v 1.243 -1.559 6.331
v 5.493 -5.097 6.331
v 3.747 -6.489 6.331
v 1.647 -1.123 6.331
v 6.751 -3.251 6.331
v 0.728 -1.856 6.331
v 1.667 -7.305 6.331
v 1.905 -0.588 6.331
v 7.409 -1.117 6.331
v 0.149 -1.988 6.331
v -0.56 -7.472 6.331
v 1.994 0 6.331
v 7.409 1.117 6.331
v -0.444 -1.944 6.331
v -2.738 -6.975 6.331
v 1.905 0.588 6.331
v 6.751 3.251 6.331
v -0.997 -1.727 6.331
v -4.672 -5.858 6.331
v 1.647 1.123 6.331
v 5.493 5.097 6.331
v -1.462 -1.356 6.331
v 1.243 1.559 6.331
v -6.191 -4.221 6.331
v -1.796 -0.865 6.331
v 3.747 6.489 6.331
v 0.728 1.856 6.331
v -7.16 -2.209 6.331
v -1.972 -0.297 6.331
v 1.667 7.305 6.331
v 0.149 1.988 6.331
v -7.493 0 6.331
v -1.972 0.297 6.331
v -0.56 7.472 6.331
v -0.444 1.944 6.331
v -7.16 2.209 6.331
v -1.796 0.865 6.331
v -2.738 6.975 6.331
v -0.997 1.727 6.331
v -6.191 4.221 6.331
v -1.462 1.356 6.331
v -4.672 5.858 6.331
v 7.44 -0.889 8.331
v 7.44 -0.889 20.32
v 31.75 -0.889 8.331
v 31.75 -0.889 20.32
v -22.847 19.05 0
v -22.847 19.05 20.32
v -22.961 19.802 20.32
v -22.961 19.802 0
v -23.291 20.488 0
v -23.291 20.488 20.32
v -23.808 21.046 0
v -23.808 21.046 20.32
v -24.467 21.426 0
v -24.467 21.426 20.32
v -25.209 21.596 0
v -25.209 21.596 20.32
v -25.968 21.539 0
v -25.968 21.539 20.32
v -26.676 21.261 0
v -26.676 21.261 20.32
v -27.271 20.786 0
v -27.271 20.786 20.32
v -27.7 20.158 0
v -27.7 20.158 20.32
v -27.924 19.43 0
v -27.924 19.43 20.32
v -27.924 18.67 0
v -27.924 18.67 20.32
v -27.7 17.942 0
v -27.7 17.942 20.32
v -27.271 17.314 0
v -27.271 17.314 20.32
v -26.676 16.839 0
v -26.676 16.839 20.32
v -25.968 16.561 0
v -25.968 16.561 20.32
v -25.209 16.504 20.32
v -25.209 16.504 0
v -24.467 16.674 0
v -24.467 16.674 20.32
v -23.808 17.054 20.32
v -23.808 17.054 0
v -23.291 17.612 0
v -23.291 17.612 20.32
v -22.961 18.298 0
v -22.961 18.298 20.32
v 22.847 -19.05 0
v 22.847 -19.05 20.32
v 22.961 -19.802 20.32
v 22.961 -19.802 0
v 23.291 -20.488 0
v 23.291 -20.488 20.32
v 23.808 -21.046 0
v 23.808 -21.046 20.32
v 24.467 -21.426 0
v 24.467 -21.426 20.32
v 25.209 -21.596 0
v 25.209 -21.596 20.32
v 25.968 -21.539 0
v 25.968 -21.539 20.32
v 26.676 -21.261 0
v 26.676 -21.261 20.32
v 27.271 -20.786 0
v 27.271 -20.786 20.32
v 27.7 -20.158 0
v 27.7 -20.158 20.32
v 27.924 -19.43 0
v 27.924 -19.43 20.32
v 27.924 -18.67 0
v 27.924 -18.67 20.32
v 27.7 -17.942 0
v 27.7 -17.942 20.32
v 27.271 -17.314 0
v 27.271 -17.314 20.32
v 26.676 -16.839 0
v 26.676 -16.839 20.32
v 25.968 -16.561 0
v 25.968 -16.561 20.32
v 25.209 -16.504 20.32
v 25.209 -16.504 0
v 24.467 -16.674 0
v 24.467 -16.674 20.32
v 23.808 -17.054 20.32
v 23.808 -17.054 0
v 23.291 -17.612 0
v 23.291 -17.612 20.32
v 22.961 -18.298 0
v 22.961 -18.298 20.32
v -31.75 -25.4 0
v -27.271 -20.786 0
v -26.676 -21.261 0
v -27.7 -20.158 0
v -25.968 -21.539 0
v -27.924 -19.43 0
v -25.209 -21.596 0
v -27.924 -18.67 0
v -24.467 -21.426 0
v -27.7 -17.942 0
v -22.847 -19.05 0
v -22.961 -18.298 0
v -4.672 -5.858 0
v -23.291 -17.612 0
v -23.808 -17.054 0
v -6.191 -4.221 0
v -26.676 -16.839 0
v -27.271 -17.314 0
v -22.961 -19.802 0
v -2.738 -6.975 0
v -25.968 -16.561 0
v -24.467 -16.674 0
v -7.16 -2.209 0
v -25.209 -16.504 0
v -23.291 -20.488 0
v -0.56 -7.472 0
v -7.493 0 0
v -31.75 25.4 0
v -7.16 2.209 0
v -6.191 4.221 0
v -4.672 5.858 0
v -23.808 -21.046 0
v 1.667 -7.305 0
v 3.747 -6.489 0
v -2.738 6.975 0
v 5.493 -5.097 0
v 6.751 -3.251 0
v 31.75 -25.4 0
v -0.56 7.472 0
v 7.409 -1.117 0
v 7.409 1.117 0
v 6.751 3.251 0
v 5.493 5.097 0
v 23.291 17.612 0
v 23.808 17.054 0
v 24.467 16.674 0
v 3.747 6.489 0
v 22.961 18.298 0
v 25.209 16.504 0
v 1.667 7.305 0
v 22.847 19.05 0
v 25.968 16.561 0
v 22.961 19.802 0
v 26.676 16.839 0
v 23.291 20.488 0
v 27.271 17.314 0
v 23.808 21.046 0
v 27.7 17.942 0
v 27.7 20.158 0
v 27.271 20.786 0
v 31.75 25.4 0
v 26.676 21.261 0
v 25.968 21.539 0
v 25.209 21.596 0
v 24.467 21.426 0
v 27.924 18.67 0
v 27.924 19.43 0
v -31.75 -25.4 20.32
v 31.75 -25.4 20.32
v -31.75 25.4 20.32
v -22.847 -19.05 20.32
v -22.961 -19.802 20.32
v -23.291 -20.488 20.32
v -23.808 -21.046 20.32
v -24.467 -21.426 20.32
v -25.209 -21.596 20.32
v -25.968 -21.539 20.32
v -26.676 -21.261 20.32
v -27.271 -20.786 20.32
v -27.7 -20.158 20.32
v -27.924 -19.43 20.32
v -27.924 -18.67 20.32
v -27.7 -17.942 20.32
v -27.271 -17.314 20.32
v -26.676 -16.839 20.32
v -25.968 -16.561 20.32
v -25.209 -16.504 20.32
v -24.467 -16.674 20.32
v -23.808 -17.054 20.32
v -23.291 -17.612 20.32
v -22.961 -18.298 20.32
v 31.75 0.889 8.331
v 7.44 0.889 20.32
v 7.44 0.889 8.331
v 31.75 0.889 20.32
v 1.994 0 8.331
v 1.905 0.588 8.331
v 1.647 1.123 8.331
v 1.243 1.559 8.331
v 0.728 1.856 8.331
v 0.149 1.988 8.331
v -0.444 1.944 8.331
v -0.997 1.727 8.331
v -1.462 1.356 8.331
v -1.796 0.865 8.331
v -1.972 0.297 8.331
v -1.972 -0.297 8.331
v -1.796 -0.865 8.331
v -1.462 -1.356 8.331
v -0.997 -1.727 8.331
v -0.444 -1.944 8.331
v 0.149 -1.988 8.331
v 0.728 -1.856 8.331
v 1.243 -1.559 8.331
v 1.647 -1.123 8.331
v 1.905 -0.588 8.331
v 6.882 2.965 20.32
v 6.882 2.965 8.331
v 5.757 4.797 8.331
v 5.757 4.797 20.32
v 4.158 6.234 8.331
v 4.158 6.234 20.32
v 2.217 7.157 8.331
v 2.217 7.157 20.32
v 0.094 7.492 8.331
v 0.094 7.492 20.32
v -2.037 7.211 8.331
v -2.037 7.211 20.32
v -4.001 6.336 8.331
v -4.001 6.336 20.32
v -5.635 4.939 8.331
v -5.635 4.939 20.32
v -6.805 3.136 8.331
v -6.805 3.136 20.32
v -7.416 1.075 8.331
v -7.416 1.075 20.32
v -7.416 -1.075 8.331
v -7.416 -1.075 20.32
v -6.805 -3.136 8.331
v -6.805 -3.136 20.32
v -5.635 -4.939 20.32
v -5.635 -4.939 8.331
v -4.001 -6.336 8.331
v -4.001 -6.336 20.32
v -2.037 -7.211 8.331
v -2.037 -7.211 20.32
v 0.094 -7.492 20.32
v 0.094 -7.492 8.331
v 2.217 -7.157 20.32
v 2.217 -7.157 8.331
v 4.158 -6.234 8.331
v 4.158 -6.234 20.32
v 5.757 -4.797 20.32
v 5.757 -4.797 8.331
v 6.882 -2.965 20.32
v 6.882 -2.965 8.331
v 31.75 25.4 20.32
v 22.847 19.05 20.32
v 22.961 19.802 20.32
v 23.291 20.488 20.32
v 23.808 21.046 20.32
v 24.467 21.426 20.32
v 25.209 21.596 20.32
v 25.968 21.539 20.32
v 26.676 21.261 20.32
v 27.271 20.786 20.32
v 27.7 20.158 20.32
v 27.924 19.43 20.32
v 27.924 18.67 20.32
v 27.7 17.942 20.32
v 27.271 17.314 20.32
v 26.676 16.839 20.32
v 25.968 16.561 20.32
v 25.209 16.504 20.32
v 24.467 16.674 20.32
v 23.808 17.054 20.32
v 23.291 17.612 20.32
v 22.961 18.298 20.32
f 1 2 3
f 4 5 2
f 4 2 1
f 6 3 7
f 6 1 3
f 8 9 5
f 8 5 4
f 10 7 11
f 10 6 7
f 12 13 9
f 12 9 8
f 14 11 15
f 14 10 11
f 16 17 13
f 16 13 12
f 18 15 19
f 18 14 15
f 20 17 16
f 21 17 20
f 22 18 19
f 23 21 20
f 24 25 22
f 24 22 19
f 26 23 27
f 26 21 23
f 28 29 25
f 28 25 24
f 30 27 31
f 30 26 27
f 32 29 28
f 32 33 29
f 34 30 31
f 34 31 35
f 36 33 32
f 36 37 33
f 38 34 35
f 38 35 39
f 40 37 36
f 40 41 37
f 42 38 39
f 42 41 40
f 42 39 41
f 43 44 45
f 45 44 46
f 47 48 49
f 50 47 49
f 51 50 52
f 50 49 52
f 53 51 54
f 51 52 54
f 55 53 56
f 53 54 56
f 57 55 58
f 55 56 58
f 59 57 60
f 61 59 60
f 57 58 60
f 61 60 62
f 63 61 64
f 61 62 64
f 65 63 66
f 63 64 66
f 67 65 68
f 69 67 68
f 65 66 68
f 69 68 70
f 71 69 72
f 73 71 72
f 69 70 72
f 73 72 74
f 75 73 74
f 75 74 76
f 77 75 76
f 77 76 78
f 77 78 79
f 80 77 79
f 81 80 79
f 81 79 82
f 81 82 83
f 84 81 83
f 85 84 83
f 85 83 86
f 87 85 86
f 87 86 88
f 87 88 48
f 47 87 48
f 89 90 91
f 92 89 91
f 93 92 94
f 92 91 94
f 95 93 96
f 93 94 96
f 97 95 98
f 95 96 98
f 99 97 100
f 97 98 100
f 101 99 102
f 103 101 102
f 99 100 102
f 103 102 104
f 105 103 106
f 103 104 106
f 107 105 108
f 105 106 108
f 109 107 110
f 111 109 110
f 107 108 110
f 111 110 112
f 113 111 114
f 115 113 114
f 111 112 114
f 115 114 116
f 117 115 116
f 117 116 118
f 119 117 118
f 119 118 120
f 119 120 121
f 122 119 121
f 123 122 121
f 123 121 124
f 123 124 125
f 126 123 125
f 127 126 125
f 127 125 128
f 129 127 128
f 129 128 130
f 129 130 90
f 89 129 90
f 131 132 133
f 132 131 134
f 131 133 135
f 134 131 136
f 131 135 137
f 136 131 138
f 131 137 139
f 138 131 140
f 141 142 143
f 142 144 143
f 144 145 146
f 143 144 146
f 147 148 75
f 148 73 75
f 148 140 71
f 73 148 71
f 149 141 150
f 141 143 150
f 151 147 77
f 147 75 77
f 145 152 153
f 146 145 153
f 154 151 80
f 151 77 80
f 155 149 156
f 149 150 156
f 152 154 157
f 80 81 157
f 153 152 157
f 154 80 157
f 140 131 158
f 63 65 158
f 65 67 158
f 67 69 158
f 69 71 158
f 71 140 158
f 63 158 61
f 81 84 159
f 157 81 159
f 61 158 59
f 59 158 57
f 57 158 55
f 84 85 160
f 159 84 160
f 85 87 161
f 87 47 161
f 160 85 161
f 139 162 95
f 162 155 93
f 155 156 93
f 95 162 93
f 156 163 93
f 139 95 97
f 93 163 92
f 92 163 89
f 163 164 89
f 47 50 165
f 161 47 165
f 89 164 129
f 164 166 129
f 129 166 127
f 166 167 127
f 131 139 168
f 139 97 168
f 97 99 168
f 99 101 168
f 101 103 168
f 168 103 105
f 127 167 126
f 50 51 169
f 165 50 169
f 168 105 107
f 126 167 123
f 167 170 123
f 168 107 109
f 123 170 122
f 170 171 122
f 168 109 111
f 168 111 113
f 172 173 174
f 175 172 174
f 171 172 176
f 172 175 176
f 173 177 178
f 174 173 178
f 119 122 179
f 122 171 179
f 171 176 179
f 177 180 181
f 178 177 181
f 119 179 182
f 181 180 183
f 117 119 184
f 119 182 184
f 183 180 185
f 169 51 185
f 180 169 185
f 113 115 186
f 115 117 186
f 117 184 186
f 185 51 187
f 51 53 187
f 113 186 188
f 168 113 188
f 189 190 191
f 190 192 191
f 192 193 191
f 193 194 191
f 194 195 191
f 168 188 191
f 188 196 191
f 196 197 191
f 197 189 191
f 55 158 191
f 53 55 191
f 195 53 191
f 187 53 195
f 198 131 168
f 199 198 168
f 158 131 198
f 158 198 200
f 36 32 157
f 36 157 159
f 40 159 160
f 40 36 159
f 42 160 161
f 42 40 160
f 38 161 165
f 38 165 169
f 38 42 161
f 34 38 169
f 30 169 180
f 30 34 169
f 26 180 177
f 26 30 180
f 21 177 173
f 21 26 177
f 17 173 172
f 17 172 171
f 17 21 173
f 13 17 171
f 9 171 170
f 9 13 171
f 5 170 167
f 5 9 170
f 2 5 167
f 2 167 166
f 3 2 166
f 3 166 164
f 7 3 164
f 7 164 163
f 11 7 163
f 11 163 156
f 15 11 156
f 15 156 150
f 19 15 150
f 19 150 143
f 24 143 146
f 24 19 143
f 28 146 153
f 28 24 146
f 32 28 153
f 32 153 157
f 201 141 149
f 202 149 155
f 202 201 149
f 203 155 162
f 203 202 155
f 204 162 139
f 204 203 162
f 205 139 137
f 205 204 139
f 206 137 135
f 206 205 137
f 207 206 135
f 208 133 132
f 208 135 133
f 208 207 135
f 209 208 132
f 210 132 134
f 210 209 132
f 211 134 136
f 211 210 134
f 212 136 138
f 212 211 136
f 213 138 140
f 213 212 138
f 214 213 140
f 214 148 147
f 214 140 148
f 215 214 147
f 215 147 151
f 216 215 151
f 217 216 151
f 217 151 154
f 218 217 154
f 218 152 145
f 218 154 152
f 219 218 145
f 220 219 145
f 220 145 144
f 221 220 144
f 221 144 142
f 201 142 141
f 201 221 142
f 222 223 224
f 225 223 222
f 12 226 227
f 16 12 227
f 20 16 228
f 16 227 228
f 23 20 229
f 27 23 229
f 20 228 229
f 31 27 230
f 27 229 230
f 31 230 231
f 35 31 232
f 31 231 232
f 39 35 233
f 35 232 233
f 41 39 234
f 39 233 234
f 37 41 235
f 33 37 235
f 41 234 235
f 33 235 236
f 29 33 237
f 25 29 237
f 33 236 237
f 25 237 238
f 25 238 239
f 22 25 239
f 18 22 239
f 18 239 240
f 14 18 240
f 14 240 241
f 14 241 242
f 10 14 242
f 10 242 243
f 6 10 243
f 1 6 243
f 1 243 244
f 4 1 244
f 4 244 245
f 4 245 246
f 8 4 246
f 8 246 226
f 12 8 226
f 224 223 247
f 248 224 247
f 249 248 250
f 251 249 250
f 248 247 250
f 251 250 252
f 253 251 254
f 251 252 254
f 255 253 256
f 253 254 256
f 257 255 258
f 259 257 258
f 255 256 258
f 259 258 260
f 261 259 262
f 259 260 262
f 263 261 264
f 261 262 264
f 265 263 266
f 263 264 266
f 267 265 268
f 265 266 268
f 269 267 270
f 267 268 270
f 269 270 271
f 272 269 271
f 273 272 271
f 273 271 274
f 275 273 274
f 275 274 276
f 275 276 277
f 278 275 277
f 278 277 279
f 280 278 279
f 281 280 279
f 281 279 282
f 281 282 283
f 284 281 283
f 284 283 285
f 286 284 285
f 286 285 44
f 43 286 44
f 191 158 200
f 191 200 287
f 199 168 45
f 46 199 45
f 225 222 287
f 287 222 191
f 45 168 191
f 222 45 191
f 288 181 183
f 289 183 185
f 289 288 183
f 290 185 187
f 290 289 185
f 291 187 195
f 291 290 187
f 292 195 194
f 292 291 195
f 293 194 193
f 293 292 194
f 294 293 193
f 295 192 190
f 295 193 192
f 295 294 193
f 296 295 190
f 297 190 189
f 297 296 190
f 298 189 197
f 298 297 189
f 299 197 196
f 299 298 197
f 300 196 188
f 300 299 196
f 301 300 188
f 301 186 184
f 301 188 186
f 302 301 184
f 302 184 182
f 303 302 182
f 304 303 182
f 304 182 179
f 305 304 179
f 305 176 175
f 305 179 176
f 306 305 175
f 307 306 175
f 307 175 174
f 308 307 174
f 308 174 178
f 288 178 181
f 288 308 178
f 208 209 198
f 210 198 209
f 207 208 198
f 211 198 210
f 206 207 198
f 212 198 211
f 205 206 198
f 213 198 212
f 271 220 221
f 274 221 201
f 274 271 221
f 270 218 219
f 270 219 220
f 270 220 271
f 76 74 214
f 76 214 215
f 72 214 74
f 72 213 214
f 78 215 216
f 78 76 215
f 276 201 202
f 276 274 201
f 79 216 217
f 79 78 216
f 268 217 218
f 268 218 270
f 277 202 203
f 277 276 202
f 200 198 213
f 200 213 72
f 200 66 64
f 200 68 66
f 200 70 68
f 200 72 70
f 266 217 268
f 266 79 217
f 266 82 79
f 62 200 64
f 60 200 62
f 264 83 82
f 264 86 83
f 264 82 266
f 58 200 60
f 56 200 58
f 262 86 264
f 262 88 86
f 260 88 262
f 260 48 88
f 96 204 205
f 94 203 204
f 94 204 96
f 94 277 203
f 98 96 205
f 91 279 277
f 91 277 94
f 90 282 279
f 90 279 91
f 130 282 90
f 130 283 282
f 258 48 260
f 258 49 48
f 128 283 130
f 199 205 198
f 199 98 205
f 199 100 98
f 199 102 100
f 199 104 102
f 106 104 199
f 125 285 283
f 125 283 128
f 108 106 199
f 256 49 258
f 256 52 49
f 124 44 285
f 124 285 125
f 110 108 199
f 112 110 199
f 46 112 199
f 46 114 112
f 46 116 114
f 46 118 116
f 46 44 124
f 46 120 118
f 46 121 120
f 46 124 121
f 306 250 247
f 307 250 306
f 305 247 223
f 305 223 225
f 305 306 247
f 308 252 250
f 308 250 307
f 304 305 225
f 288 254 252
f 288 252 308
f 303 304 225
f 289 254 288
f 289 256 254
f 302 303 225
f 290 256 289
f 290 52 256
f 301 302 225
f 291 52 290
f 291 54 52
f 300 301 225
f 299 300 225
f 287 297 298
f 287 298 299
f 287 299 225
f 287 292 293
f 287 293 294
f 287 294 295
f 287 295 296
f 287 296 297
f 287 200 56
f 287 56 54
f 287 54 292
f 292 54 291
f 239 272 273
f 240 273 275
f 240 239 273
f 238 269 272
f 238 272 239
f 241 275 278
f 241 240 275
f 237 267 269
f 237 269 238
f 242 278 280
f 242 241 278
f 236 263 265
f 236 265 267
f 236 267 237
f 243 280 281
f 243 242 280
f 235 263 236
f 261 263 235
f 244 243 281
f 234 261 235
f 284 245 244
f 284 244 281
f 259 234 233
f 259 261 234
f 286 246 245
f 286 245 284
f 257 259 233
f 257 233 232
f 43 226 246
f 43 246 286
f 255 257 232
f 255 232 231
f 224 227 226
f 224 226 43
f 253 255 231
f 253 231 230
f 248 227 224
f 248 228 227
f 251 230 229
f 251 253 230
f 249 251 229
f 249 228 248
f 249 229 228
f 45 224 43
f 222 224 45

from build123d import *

# Parameters (mm, degrees)
SKETCH1_W               = 63.5
SKETCH1_H               = 50.8
BOSS_EXTRUDE1_DEPTH     = 20.32
SKETCH2_R               = 7.493
CUT_EXTRUDE1_DEPTH      = 11.9888
SKETCH3_W               = 31.75
SKETCH3_H               = 1.778
CUT_EXTRUDE2_DEPTH      = 11.9888
SKETCH9_R               = 1.9939
CUT_EXTRUDE3_DEPTH      = 11.9888
CUT_EXTRUDE4_START      = -6.331204
SKETCH10_R              = 7.493
CUT_EXTRUDE4_DEPTH      = 6.331204
SKETCH11_R              = 2.5527
CUT_EXTRUDE5_DEPTH      = 21.32
MIRROR2_COPY_1_SKETCH_R = 2.5527
MIRROR2_COPY_1_DEPTH    = 21.32


with BuildPart() as part:
    # Sketch1 → Boss-Extrude1 (new body)
    with BuildSketch(Plane.XY):
        Rectangle(SKETCH1_W, SKETCH1_H)
    extrude(amount=BOSS_EXTRUDE1_DEPTH)

    # Sketch2 → Cut-Extrude1 (cut)
    with BuildSketch(Plane.XY.offset(20.32)):
        Circle(SKETCH2_R)
    extrude(amount=-CUT_EXTRUDE1_DEPTH, mode=Mode.SUBTRACT)

    # Sketch3 → Cut-Extrude2 (cut)
    with BuildSketch(Plane.XY.offset(20.32)):
        with Locations((15.875, 0)):
            Rectangle(SKETCH3_W, SKETCH3_H)
    extrude(amount=-CUT_EXTRUDE2_DEPTH, mode=Mode.SUBTRACT)

    # Sketch9 → Cut-Extrude3 (cut)
    with BuildSketch(Plane.XY.offset(8.3312)):
        Circle(SKETCH9_R)
    extrude(amount=-CUT_EXTRUDE3_DEPTH, mode=Mode.SUBTRACT)

    # Sketch10 → Cut-Extrude4 (cut)
    with BuildSketch(Plane(origin=(0, 0, 0), x_dir=(-1, 0, 0), z_dir=(0, 0, -1)).offset(CUT_EXTRUDE4_START)):
        Circle(SKETCH10_R)
    extrude(amount=CUT_EXTRUDE4_DEPTH, mode=Mode.SUBTRACT)

    # Sketch11 → Cut-Extrude5 (cut, through all)
    with BuildSketch(Plane.XY.offset(20.32)):
        with Locations((-25.4, 19.05)):
            Circle(SKETCH11_R)
    cut_extrude5 = extrude(amount=-CUT_EXTRUDE5_DEPTH, mode=Mode.SUBTRACT)

    # Mirror1: Cut-Extrude5 across plane
    add(cut_extrude5.mirror(Plane(origin=(0, 0, 0), x_dir=(0, 0, 1), z_dir=(1, 0, 0))), mode=Mode.SUBTRACT)

    # Mirror2: Cut-Extrude5 across plane
    add(cut_extrude5.mirror(Plane.ZX), mode=Mode.SUBTRACT)

    # Mirror2 copy 1 sketch → Mirror2 copy 1 (cut, through all)
    with BuildSketch(Plane(origin=(0, 0, 20.32), x_dir=(-1, 0, 0), z_dir=(0, 0, 1))):
        with Locations((-25.4, 19.05)):
            Circle(MIRROR2_COPY_1_SKETCH_R)
    extrude(amount=-MIRROR2_COPY_1_DEPTH, mode=Mode.SUBTRACT)


solid = part.part
